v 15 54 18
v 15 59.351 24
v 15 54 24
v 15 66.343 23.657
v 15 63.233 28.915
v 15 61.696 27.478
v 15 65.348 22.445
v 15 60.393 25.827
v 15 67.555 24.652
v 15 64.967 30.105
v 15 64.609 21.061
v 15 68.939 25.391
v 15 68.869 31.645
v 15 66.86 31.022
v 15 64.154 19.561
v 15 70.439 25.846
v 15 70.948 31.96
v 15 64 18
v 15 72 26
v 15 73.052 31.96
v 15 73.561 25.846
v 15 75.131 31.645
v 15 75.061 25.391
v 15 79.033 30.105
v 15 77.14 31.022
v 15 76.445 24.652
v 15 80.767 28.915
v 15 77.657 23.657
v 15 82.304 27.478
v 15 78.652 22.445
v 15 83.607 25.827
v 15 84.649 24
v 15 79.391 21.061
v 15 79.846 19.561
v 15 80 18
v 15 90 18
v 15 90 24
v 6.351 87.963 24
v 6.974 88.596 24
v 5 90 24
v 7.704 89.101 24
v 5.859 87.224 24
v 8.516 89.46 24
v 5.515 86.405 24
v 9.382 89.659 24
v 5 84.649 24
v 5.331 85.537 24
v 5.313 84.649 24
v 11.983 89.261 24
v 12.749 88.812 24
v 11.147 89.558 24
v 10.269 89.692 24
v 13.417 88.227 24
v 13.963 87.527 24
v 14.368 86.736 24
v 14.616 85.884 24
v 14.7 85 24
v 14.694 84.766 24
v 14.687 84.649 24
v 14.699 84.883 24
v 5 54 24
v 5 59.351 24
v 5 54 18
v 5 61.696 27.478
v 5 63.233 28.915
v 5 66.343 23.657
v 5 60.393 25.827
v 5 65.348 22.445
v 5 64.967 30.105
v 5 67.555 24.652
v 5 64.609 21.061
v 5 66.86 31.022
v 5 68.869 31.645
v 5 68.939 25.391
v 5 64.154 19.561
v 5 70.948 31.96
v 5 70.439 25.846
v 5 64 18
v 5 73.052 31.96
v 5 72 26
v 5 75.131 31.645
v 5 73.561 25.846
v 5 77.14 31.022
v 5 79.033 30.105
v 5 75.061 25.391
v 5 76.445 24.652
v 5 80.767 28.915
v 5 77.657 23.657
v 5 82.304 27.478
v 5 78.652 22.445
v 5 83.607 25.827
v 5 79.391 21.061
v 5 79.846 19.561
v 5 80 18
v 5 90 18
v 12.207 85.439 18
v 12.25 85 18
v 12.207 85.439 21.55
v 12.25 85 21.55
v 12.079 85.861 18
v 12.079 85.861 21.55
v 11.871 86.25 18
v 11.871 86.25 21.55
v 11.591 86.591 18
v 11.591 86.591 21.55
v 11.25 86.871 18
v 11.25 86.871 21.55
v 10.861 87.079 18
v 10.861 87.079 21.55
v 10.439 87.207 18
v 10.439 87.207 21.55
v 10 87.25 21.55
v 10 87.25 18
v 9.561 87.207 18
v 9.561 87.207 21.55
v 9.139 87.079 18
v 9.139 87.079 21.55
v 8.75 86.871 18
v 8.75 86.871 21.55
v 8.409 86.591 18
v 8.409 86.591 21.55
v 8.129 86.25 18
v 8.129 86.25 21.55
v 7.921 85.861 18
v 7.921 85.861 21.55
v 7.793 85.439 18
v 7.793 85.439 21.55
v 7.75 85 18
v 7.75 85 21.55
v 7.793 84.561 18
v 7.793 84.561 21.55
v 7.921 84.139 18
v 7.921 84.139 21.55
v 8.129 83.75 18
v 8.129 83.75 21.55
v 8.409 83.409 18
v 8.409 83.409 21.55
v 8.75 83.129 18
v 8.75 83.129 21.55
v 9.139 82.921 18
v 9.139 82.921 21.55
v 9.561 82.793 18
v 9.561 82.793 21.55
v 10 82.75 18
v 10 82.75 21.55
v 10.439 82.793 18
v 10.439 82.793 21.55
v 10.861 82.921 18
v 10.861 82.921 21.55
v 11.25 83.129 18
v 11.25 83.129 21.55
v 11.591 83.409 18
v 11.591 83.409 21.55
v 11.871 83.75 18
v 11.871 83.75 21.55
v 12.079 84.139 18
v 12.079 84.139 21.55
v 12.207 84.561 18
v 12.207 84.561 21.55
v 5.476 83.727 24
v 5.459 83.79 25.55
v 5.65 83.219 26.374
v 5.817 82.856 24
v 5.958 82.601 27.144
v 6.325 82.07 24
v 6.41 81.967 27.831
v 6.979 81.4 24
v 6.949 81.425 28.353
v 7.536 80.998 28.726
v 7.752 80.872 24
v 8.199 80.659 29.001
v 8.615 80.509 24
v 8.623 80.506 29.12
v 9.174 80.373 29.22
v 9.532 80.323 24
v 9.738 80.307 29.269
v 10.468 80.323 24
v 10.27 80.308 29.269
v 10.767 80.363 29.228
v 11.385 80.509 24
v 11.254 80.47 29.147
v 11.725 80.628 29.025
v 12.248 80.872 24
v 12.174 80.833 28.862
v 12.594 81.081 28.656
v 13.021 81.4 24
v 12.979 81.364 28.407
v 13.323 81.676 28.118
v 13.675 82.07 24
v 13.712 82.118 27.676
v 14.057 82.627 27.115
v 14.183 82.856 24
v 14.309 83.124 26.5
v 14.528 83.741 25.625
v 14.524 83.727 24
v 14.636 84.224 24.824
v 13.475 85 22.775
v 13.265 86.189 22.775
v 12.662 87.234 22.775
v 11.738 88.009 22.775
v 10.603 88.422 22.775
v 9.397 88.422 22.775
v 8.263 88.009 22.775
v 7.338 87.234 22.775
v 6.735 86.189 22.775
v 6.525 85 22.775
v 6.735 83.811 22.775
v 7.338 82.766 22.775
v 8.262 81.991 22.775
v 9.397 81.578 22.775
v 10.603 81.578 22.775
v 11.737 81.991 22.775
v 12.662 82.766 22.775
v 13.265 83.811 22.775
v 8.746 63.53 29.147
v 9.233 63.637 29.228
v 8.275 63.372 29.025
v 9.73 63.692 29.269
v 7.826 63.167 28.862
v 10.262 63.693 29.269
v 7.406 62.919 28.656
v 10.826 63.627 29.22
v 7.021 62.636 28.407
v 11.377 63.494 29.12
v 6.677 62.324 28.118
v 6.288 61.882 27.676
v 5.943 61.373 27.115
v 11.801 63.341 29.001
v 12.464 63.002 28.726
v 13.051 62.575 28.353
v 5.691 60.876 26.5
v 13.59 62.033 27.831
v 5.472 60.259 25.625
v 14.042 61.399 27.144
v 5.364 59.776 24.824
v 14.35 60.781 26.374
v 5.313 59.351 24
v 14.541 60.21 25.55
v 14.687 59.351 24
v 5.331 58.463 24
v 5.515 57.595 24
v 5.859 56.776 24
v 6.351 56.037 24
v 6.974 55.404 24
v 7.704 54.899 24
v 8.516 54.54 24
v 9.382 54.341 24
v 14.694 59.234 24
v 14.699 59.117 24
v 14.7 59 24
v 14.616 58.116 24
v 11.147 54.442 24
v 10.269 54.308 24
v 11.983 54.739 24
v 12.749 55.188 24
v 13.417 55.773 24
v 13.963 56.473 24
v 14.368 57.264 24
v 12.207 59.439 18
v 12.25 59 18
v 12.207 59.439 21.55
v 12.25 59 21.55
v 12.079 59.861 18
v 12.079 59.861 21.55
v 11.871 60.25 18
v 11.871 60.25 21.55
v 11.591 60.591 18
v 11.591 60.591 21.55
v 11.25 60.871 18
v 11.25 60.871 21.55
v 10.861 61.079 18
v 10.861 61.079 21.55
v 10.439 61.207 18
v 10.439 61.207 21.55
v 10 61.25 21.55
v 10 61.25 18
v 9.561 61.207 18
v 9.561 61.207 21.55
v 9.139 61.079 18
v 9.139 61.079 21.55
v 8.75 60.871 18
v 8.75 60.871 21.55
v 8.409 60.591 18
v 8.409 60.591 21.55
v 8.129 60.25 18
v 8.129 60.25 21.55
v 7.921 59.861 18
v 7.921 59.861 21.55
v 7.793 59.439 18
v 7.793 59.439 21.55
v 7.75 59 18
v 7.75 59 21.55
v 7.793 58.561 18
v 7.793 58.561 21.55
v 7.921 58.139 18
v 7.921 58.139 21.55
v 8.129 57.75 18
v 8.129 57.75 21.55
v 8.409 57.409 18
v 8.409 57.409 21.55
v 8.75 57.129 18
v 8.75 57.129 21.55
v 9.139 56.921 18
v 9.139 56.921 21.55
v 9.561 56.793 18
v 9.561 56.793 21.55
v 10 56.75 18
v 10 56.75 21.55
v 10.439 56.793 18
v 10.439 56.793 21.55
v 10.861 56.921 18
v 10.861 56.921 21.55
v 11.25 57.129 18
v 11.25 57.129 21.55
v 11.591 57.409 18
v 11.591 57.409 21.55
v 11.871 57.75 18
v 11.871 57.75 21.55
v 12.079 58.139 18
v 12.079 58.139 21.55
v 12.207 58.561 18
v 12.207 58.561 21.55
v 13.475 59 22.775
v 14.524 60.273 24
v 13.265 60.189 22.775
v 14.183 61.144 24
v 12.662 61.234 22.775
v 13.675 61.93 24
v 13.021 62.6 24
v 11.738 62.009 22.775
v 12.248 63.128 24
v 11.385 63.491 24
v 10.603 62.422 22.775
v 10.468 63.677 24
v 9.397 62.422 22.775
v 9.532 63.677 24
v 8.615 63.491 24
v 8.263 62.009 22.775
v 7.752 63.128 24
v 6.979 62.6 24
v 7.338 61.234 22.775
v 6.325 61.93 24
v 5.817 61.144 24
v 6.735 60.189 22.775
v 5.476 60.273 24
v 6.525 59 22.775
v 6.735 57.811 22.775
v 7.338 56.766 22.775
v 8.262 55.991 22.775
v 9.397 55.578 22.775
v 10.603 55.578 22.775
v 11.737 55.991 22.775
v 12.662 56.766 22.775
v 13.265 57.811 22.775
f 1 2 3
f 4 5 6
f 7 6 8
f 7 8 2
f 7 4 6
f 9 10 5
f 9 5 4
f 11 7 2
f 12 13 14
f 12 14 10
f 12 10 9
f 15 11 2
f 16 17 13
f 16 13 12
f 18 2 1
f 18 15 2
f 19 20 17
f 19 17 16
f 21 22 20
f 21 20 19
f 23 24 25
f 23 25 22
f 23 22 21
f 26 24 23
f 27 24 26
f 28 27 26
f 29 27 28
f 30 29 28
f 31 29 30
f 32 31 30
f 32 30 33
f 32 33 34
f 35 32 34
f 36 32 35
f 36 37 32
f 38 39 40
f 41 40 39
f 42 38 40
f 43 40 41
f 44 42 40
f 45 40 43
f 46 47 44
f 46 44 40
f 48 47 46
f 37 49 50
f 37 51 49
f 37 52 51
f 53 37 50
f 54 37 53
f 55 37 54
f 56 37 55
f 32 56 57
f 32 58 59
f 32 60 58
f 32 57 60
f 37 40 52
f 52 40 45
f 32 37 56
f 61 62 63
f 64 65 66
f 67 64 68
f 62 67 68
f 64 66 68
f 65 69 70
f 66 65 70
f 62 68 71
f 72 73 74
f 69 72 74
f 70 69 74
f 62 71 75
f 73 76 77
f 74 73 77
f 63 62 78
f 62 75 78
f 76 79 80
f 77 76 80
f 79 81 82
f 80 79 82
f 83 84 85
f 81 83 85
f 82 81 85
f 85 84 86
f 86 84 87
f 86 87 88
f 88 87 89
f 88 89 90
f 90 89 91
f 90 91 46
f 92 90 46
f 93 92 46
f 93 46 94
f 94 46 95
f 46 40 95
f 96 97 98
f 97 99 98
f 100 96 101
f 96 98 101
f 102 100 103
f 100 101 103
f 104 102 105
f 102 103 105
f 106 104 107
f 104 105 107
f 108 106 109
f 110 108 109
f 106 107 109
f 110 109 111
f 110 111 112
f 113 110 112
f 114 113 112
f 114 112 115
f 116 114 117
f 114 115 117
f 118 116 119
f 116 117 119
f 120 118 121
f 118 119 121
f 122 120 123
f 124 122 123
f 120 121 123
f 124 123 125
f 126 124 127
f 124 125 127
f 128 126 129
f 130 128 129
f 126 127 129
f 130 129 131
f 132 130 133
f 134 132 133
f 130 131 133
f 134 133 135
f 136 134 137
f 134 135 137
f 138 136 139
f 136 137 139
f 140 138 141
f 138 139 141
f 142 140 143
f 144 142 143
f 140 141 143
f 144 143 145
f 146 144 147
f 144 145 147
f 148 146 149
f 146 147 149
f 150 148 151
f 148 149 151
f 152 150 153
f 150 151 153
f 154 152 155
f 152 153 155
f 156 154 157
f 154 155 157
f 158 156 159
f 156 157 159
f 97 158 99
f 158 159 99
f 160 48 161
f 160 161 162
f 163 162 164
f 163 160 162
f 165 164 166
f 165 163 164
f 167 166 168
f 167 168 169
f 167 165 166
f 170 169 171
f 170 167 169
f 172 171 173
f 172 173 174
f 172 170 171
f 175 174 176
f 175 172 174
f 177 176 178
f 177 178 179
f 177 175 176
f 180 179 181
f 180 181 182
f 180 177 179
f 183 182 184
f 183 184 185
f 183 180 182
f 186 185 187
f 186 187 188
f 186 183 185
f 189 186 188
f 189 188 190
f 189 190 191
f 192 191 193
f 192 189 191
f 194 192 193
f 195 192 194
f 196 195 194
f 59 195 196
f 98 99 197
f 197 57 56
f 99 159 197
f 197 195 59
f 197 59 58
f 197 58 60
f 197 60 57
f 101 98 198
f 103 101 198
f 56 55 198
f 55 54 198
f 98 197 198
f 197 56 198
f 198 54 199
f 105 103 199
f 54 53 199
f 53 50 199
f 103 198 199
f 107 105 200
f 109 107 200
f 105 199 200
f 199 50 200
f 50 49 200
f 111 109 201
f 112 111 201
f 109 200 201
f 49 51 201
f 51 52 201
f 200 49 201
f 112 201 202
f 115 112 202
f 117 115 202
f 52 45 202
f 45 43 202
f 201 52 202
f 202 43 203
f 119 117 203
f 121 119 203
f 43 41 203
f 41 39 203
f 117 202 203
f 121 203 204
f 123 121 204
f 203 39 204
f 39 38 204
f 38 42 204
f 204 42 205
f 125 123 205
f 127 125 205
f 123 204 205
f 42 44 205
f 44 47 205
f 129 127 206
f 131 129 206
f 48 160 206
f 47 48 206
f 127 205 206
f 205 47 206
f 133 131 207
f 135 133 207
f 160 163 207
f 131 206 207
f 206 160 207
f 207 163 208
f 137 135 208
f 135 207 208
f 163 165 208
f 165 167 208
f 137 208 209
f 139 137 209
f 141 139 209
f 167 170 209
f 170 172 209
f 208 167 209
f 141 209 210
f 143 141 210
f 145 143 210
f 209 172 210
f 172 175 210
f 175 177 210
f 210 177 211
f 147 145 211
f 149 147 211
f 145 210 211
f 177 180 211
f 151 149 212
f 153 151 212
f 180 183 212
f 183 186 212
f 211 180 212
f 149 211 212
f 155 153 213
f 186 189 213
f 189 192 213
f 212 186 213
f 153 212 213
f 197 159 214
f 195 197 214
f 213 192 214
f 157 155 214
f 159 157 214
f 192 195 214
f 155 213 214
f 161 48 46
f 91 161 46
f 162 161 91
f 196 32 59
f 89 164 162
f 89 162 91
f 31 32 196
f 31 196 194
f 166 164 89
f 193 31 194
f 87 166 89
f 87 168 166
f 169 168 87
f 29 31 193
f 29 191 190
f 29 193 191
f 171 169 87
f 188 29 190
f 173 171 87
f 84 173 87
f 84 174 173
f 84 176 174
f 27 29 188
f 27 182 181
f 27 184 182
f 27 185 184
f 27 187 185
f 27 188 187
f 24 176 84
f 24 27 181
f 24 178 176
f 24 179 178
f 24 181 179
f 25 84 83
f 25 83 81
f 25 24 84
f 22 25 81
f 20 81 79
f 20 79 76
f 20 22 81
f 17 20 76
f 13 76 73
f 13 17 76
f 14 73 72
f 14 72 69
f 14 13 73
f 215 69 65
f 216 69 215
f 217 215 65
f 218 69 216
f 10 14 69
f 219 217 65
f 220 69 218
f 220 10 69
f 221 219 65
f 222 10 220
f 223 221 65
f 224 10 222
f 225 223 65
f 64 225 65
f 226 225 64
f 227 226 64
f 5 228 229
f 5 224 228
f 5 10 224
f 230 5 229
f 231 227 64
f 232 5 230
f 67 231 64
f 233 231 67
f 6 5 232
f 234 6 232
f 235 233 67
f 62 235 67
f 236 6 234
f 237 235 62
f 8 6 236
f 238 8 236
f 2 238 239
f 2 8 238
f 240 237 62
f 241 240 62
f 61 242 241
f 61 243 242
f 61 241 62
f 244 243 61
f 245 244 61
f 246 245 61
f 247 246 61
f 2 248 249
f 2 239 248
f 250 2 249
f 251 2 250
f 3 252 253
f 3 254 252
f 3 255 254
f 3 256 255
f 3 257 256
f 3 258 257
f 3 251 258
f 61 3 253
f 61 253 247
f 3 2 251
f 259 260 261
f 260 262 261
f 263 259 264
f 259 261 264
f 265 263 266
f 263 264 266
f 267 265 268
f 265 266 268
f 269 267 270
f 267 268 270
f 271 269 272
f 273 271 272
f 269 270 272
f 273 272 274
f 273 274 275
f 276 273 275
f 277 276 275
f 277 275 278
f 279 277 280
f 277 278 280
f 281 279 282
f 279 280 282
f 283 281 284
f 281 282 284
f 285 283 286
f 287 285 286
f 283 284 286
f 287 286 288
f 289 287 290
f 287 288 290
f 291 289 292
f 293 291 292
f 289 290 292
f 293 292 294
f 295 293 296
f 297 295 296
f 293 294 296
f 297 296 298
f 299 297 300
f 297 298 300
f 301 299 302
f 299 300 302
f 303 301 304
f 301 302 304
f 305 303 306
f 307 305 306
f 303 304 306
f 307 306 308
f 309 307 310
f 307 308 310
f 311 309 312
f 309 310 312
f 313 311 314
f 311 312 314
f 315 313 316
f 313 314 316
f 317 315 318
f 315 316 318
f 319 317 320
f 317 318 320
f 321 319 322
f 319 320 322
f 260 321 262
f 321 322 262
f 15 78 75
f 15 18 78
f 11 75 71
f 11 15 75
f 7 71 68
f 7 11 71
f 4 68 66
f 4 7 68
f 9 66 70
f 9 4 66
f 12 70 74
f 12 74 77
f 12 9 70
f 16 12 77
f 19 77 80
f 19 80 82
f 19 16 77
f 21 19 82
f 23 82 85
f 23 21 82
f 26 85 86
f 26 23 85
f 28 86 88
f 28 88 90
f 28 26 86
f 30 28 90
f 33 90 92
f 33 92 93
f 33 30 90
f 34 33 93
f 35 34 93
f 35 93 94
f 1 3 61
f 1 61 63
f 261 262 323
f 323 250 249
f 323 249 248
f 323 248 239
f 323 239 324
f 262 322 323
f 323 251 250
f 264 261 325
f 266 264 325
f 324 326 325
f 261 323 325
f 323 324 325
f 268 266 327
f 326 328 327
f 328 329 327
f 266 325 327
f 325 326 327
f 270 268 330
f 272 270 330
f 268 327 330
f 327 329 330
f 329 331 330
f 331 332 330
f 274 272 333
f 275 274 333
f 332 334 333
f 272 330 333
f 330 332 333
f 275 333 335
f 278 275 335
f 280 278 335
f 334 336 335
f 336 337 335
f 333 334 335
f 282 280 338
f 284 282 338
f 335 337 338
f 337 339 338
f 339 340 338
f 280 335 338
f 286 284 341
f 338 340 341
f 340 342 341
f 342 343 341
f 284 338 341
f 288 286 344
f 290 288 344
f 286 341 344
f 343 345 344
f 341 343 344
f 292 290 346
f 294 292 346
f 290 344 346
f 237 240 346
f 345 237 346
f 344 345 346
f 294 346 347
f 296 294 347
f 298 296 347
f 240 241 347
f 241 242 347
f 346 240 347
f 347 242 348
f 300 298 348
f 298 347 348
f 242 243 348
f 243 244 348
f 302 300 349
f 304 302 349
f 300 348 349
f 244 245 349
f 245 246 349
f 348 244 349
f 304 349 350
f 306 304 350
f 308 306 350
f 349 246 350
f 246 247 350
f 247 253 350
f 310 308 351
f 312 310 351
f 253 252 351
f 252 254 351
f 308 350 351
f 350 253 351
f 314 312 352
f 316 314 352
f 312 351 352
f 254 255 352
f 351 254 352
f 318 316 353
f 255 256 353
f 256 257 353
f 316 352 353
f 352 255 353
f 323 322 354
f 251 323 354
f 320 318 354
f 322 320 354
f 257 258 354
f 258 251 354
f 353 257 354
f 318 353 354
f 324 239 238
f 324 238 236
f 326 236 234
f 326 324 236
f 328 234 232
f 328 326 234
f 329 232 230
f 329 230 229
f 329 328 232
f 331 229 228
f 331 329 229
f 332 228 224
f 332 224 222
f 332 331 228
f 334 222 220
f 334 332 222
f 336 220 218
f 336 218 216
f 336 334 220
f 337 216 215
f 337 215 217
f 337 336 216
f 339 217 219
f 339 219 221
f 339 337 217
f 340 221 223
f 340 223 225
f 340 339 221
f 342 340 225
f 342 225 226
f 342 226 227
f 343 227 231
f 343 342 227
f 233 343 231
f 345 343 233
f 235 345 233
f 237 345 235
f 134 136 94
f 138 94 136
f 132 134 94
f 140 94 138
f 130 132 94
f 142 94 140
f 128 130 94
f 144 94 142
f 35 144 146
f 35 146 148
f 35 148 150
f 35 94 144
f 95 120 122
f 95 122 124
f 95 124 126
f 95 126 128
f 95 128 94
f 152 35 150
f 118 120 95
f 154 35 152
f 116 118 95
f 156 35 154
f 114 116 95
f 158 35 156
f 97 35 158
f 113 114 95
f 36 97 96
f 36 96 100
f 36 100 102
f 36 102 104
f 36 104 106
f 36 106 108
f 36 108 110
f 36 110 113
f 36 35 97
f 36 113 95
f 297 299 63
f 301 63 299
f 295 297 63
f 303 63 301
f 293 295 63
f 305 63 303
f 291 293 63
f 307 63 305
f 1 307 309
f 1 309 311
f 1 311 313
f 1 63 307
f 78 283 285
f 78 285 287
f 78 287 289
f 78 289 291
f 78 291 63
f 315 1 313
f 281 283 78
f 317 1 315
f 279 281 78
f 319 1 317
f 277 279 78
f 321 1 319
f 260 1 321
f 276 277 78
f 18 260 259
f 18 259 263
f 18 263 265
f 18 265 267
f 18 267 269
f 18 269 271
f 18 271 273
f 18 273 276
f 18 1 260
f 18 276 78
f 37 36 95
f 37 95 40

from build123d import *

# Parameters (mm, degrees)
EXTRUDE_1_DEPTH     = 5
CUT_EXTRUDE_1_REACH = 93.591
SKETCH_5_R          = 4.7


# Read off the part's stored shape, not the designer's step: 高级异型孔1
with BuildPart() as part:
    # 草图1 → 凸台-拉伸1 (new, symmetric)
    with BuildSketch(Plane(origin=(10, 0, 0), x_dir=(0, 0, -1), z_dir=(1, 0, 0))):
        with BuildLine():
            Line((-18, 80), (-18, 90))
            Line((-18, 90), (-24, 90))
            Line((-24, 90), (-24, 84.649110641))
            ThreePointArc((-24, 84.649110641), (-32, 72), (-24, 59.350889359))
            Line((-24, 59.350889359), (-24, 54))
            Line((-24, 54), (-18, 54))
            Line((-18, 54), (-18, 64))
            ThreePointArc((-18, 64), (-26, 72), (-18, 80))
        make_face()
    extrude(amount=EXTRUDE_1_DEPTH, both=True)

    # 高级异型孔1 outline → 高级异型孔1 (revolve, cut)
    with BuildSketch(Plane(origin=(10, 59, 0), x_dir=(1, 0, 0), z_dir=(0, -1, 0))):
        Polygon((0, 18), (2.25, 18), (2.25, 21.55), (4.7, 24), (0, 24), align=None)
    revolve(axis=Axis((10, 59, 0), (0, 0, 1)), mode=Mode.SUBTRACT)

    # Other 1 2 outline → Other 1 2 (revolve, cut)
    with BuildSketch(Plane(origin=(10, 85, 0), x_dir=(1, 0, 0), z_dir=(0, -1, 0))):
        Polygon((0, 18), (2.25, 18), (2.25, 21.55), (4.7, 24), (0, 24), align=None)
    revolve(axis=Axis((10, 85, 0), (0, 0, 1)), mode=Mode.SUBTRACT)

    # 草图5 → 切除-拉伸1 (cut, up to next)
    with BuildSketch(Plane.XY.offset(24), mode=Mode.PRIVATE) as cut_extrude_1_sk1:
        with Locations((10, 85)):
            Circle(SKETCH_5_R)
    cut_extrude_1_tool1 = extrude(cut_extrude_1_sk1.sketch, amount=CUT_EXTRUDE_1_REACH, mode=Mode.PRIVATE) & part.part
    # 草图5 → 切除-拉伸1 (cut, up to next)
    with BuildSketch(Plane.XY.offset(24), mode=Mode.PRIVATE) as cut_extrude_1_sk2:
        with Locations((10, 59)):
            Circle(SKETCH_5_R)
    cut_extrude_1_tool2 = extrude(cut_extrude_1_sk2.sketch, amount=CUT_EXTRUDE_1_REACH, mode=Mode.PRIVATE) & part.part
    add(cut_extrude_1_tool1.solids().sort_by_distance((10, 85, 24))[0], mode=Mode.SUBTRACT)
    add(cut_extrude_1_tool2.solids().sort_by_distance((10, 59, 24))[0], mode=Mode.SUBTRACT)


solid = part.part
